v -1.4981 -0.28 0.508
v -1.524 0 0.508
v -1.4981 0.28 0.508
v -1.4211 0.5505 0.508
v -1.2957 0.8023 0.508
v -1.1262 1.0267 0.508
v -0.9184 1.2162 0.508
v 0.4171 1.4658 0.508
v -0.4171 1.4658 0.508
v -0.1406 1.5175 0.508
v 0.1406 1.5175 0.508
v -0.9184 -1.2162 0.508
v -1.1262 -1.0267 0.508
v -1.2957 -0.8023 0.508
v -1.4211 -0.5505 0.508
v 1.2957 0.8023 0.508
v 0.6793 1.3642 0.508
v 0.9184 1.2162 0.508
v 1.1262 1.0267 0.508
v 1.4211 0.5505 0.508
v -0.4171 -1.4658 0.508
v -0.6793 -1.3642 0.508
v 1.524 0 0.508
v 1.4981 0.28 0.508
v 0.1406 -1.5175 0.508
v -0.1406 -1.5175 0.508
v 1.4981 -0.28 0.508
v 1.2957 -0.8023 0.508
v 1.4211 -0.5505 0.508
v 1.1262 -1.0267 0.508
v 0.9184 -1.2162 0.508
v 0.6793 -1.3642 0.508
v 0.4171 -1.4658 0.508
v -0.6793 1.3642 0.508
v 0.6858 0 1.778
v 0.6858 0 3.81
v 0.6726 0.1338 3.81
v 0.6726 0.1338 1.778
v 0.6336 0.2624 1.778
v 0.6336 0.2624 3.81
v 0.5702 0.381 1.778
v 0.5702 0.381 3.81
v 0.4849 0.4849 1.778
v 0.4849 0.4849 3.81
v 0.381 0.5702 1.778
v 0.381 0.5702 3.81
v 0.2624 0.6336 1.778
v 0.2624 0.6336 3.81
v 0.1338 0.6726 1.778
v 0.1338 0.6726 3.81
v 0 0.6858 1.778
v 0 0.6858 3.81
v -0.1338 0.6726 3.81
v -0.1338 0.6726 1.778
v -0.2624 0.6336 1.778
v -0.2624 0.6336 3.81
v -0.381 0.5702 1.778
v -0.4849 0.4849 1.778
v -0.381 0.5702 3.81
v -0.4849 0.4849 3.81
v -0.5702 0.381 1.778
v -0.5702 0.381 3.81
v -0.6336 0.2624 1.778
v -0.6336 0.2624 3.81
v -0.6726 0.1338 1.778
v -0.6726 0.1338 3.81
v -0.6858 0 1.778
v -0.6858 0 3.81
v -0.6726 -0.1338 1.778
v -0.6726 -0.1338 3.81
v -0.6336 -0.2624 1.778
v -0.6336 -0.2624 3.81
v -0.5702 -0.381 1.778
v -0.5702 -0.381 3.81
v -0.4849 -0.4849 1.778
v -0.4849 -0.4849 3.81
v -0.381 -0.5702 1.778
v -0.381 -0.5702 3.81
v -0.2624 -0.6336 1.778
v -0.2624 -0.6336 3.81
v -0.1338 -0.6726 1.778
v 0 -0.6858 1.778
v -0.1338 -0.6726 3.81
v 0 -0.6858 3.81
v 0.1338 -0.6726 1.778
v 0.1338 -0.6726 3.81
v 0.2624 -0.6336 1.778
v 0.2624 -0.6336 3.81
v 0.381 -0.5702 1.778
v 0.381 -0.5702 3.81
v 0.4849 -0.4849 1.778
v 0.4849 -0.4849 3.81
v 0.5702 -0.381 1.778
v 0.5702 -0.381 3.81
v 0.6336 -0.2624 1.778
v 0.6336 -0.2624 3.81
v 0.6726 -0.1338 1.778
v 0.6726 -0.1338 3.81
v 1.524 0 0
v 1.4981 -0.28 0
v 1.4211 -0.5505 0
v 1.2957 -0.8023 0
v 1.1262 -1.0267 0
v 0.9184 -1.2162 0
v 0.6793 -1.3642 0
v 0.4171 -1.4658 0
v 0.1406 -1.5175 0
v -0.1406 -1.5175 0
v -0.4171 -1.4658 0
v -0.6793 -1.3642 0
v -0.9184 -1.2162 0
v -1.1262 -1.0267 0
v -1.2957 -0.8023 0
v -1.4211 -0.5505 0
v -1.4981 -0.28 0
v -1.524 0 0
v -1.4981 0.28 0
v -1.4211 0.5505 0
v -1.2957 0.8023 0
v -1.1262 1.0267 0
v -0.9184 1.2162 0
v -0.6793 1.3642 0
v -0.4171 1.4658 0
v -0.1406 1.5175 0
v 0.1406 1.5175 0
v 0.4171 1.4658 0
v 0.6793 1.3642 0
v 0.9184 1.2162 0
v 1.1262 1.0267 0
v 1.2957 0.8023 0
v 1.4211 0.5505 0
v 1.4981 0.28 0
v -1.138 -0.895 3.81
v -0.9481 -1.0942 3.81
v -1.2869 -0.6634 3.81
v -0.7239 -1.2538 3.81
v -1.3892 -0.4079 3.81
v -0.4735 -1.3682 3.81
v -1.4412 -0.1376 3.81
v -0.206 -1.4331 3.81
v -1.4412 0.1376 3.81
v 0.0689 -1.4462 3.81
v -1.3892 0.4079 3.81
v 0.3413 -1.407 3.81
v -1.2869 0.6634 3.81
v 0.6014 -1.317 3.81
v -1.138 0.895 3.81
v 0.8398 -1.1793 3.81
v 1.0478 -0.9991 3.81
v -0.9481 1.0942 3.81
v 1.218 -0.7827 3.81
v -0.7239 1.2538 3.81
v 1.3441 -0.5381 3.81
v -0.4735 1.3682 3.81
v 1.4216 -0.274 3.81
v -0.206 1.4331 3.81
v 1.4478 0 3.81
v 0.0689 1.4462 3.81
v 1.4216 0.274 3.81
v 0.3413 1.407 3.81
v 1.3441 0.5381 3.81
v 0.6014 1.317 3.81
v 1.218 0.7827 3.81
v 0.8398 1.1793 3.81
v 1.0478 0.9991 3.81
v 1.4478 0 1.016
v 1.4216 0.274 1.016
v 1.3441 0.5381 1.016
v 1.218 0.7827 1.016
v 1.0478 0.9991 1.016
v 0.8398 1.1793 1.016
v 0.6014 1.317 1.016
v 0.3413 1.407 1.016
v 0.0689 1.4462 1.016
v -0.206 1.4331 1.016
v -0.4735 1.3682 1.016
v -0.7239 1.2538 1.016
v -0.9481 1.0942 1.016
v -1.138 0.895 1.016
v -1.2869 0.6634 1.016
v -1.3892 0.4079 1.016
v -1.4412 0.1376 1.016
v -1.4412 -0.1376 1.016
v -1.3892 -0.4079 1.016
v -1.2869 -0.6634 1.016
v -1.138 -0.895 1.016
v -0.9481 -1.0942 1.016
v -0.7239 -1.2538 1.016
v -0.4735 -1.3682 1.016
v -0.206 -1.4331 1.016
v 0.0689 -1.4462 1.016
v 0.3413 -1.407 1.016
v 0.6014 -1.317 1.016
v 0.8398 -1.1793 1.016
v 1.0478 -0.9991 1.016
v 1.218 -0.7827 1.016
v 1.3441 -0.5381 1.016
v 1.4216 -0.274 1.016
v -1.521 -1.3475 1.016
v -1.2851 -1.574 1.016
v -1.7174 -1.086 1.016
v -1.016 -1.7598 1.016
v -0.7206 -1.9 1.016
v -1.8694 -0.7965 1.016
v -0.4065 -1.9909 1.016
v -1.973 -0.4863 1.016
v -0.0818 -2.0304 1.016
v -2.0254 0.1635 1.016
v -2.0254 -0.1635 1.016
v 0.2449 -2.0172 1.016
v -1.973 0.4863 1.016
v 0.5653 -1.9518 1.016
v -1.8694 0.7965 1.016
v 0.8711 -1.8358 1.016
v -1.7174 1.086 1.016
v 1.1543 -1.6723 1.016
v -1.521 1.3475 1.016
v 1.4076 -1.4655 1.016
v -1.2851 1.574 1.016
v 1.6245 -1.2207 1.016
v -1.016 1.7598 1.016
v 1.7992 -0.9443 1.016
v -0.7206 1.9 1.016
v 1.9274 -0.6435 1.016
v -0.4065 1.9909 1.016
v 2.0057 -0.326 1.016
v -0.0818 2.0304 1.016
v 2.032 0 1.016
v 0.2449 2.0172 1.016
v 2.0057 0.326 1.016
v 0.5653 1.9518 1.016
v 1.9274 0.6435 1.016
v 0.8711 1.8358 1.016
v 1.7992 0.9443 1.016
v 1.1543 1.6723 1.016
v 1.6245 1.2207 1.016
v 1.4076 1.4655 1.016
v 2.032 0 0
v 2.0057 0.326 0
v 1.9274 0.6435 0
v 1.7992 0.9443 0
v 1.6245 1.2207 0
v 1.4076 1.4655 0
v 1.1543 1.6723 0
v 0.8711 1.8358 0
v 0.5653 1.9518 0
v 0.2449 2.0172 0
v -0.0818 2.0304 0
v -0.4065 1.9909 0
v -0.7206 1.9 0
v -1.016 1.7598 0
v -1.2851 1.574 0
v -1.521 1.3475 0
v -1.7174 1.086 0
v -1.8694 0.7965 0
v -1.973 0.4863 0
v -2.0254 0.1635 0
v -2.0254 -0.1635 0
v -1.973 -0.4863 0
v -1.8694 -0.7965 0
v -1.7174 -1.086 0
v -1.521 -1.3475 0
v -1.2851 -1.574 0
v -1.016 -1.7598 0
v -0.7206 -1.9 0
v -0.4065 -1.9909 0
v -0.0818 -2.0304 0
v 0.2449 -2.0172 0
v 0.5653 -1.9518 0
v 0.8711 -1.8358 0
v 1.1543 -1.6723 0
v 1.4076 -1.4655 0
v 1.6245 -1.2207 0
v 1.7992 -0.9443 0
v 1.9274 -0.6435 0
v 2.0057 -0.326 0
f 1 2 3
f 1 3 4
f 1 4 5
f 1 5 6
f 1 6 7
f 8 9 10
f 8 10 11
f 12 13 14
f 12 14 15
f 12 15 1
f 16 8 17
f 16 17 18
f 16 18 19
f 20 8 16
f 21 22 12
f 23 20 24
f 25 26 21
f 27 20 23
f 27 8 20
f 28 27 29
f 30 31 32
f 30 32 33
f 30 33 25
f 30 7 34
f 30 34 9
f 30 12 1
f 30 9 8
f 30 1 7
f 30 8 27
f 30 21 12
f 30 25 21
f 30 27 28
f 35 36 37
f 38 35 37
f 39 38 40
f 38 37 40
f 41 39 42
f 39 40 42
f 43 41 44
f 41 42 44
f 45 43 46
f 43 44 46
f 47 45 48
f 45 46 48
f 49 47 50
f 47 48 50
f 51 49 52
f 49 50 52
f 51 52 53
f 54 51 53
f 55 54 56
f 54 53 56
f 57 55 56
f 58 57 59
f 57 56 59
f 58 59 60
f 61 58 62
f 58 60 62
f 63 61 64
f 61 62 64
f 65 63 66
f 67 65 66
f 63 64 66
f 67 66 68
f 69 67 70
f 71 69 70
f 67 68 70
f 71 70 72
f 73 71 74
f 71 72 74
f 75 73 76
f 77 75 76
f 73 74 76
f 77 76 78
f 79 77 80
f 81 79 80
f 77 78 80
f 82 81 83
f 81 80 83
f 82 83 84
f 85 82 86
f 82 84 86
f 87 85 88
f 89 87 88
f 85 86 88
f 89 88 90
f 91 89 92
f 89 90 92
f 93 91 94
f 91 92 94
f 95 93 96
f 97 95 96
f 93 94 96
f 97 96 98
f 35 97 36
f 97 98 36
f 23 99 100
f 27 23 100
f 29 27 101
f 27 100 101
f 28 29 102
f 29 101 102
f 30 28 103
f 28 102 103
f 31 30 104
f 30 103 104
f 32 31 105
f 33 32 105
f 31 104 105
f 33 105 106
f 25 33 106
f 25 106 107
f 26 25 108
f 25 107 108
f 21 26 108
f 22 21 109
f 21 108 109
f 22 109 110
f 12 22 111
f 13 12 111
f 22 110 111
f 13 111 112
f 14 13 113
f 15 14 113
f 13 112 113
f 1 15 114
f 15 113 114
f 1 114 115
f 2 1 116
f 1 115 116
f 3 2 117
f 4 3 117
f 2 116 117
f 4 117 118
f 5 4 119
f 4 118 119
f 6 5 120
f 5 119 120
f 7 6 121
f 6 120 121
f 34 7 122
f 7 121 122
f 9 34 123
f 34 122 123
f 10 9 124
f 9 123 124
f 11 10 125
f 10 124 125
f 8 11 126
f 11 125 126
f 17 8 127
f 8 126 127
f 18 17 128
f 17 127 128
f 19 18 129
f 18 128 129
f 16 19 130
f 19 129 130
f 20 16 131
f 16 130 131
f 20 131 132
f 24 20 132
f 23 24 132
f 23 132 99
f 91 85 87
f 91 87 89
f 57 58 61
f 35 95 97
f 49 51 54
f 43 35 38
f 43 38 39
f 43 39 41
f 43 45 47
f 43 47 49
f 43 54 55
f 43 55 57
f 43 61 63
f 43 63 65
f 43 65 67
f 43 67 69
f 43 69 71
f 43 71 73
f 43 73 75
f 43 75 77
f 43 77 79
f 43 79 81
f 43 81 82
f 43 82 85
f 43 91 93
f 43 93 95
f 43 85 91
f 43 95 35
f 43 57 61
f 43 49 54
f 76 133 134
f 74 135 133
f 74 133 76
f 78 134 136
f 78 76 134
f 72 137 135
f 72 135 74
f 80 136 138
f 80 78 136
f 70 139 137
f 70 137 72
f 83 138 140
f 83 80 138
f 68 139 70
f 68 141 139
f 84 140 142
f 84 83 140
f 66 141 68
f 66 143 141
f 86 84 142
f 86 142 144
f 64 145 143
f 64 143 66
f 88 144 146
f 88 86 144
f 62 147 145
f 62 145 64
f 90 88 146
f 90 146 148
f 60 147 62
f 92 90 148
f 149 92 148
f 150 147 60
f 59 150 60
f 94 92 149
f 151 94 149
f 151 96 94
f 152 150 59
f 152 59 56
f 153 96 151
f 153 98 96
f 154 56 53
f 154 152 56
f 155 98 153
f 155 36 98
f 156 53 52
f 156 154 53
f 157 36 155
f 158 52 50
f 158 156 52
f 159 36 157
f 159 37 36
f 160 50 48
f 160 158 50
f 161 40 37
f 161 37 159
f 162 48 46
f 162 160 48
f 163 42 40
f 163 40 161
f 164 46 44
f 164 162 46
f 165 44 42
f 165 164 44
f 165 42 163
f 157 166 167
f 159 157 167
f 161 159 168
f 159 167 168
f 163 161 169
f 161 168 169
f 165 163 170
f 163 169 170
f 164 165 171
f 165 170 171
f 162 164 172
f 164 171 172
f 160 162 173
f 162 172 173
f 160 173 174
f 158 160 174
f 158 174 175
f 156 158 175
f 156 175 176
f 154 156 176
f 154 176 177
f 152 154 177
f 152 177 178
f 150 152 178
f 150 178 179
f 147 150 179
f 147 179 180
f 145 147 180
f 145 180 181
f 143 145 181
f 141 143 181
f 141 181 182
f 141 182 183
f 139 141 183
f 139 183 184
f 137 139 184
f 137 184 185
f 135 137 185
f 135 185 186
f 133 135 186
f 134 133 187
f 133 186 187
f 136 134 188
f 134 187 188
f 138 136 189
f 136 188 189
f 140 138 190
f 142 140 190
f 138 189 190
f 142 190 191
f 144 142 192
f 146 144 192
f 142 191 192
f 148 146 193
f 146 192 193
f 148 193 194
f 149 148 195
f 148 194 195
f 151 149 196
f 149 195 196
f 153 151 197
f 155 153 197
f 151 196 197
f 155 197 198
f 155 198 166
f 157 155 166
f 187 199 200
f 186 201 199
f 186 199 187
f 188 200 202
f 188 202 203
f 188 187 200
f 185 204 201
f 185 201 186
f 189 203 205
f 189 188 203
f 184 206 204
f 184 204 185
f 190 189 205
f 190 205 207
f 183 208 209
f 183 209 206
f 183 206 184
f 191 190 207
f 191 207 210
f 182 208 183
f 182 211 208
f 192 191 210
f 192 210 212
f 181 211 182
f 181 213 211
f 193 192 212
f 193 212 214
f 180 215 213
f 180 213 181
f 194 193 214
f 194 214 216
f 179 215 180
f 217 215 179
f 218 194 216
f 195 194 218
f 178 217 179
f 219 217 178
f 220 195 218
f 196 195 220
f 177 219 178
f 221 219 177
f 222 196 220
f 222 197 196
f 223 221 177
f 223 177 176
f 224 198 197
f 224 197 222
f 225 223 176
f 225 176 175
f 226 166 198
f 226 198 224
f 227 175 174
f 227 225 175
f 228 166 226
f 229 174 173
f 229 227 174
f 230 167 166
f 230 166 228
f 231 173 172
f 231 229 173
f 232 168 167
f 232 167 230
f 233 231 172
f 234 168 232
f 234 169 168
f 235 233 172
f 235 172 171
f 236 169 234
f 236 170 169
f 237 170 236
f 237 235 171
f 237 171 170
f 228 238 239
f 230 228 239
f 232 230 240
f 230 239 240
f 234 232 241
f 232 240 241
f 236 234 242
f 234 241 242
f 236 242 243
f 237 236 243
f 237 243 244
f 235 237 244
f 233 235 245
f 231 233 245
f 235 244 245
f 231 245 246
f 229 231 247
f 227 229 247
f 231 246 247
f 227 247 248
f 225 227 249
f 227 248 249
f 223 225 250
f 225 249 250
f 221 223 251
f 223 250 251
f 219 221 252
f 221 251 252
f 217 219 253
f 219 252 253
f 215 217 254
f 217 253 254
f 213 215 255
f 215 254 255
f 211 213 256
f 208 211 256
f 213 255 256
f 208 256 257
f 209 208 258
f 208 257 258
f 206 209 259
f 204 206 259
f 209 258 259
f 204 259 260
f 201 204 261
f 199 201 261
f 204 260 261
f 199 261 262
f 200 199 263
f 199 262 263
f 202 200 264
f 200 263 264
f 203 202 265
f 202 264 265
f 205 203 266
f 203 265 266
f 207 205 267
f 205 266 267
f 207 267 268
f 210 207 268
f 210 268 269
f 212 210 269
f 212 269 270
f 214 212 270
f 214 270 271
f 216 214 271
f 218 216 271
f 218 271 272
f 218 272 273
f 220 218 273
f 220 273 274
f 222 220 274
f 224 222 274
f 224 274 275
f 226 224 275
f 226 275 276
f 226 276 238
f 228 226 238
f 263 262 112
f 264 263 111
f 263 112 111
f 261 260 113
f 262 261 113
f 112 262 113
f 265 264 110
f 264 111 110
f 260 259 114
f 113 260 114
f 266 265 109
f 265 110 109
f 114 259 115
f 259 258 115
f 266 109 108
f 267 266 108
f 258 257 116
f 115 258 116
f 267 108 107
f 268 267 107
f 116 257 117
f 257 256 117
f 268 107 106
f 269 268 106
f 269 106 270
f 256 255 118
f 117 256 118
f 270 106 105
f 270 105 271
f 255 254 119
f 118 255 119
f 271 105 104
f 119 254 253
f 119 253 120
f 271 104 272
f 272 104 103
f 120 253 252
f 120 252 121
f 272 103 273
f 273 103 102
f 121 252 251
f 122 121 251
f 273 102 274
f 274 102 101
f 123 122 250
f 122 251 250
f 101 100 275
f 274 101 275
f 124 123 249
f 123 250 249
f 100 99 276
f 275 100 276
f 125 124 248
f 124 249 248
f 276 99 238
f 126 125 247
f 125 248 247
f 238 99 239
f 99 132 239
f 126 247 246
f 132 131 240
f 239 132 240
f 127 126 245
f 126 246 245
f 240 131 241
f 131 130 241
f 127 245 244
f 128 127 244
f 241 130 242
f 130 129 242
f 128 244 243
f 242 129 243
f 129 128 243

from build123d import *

# Parameters (mm, degrees)
F0_R     = 1.4478
F1_DEPTH = 3.81
F2_R     = 2.032
F3_DEPTH = 1.016
F4_R     = 1.524
F5_DEPTH = 0.508
F6_R     = 0.6858
F7_DEPTH = 2.032


with BuildPart() as f1:
    # F0 (on Top) → F1 (new body)
    with BuildSketch(Plane.XY):
        Circle(F0_R)
    extrude(amount=F1_DEPTH)

    # F2 (on Top) → F3 (join)
    with BuildSketch(Plane.XY):
        Circle(F2_R)
    extrude(amount=F3_DEPTH)

    # F4 (on face) → F5 (cut)
    with BuildSketch(Plane(origin=(0, 0, 0), x_dir=(1, 0, 0), z_dir=(0, 0, -1))):
        Circle(F4_R)
    extrude(amount=-F5_DEPTH, mode=Mode.SUBTRACT)

    # F6 (on face) → F7 (cut)
    with BuildSketch(Plane.XY.offset(3.81)):
        Circle(F6_R)
    extrude(amount=-F7_DEPTH, mode=Mode.SUBTRACT)


solid = f1.part
